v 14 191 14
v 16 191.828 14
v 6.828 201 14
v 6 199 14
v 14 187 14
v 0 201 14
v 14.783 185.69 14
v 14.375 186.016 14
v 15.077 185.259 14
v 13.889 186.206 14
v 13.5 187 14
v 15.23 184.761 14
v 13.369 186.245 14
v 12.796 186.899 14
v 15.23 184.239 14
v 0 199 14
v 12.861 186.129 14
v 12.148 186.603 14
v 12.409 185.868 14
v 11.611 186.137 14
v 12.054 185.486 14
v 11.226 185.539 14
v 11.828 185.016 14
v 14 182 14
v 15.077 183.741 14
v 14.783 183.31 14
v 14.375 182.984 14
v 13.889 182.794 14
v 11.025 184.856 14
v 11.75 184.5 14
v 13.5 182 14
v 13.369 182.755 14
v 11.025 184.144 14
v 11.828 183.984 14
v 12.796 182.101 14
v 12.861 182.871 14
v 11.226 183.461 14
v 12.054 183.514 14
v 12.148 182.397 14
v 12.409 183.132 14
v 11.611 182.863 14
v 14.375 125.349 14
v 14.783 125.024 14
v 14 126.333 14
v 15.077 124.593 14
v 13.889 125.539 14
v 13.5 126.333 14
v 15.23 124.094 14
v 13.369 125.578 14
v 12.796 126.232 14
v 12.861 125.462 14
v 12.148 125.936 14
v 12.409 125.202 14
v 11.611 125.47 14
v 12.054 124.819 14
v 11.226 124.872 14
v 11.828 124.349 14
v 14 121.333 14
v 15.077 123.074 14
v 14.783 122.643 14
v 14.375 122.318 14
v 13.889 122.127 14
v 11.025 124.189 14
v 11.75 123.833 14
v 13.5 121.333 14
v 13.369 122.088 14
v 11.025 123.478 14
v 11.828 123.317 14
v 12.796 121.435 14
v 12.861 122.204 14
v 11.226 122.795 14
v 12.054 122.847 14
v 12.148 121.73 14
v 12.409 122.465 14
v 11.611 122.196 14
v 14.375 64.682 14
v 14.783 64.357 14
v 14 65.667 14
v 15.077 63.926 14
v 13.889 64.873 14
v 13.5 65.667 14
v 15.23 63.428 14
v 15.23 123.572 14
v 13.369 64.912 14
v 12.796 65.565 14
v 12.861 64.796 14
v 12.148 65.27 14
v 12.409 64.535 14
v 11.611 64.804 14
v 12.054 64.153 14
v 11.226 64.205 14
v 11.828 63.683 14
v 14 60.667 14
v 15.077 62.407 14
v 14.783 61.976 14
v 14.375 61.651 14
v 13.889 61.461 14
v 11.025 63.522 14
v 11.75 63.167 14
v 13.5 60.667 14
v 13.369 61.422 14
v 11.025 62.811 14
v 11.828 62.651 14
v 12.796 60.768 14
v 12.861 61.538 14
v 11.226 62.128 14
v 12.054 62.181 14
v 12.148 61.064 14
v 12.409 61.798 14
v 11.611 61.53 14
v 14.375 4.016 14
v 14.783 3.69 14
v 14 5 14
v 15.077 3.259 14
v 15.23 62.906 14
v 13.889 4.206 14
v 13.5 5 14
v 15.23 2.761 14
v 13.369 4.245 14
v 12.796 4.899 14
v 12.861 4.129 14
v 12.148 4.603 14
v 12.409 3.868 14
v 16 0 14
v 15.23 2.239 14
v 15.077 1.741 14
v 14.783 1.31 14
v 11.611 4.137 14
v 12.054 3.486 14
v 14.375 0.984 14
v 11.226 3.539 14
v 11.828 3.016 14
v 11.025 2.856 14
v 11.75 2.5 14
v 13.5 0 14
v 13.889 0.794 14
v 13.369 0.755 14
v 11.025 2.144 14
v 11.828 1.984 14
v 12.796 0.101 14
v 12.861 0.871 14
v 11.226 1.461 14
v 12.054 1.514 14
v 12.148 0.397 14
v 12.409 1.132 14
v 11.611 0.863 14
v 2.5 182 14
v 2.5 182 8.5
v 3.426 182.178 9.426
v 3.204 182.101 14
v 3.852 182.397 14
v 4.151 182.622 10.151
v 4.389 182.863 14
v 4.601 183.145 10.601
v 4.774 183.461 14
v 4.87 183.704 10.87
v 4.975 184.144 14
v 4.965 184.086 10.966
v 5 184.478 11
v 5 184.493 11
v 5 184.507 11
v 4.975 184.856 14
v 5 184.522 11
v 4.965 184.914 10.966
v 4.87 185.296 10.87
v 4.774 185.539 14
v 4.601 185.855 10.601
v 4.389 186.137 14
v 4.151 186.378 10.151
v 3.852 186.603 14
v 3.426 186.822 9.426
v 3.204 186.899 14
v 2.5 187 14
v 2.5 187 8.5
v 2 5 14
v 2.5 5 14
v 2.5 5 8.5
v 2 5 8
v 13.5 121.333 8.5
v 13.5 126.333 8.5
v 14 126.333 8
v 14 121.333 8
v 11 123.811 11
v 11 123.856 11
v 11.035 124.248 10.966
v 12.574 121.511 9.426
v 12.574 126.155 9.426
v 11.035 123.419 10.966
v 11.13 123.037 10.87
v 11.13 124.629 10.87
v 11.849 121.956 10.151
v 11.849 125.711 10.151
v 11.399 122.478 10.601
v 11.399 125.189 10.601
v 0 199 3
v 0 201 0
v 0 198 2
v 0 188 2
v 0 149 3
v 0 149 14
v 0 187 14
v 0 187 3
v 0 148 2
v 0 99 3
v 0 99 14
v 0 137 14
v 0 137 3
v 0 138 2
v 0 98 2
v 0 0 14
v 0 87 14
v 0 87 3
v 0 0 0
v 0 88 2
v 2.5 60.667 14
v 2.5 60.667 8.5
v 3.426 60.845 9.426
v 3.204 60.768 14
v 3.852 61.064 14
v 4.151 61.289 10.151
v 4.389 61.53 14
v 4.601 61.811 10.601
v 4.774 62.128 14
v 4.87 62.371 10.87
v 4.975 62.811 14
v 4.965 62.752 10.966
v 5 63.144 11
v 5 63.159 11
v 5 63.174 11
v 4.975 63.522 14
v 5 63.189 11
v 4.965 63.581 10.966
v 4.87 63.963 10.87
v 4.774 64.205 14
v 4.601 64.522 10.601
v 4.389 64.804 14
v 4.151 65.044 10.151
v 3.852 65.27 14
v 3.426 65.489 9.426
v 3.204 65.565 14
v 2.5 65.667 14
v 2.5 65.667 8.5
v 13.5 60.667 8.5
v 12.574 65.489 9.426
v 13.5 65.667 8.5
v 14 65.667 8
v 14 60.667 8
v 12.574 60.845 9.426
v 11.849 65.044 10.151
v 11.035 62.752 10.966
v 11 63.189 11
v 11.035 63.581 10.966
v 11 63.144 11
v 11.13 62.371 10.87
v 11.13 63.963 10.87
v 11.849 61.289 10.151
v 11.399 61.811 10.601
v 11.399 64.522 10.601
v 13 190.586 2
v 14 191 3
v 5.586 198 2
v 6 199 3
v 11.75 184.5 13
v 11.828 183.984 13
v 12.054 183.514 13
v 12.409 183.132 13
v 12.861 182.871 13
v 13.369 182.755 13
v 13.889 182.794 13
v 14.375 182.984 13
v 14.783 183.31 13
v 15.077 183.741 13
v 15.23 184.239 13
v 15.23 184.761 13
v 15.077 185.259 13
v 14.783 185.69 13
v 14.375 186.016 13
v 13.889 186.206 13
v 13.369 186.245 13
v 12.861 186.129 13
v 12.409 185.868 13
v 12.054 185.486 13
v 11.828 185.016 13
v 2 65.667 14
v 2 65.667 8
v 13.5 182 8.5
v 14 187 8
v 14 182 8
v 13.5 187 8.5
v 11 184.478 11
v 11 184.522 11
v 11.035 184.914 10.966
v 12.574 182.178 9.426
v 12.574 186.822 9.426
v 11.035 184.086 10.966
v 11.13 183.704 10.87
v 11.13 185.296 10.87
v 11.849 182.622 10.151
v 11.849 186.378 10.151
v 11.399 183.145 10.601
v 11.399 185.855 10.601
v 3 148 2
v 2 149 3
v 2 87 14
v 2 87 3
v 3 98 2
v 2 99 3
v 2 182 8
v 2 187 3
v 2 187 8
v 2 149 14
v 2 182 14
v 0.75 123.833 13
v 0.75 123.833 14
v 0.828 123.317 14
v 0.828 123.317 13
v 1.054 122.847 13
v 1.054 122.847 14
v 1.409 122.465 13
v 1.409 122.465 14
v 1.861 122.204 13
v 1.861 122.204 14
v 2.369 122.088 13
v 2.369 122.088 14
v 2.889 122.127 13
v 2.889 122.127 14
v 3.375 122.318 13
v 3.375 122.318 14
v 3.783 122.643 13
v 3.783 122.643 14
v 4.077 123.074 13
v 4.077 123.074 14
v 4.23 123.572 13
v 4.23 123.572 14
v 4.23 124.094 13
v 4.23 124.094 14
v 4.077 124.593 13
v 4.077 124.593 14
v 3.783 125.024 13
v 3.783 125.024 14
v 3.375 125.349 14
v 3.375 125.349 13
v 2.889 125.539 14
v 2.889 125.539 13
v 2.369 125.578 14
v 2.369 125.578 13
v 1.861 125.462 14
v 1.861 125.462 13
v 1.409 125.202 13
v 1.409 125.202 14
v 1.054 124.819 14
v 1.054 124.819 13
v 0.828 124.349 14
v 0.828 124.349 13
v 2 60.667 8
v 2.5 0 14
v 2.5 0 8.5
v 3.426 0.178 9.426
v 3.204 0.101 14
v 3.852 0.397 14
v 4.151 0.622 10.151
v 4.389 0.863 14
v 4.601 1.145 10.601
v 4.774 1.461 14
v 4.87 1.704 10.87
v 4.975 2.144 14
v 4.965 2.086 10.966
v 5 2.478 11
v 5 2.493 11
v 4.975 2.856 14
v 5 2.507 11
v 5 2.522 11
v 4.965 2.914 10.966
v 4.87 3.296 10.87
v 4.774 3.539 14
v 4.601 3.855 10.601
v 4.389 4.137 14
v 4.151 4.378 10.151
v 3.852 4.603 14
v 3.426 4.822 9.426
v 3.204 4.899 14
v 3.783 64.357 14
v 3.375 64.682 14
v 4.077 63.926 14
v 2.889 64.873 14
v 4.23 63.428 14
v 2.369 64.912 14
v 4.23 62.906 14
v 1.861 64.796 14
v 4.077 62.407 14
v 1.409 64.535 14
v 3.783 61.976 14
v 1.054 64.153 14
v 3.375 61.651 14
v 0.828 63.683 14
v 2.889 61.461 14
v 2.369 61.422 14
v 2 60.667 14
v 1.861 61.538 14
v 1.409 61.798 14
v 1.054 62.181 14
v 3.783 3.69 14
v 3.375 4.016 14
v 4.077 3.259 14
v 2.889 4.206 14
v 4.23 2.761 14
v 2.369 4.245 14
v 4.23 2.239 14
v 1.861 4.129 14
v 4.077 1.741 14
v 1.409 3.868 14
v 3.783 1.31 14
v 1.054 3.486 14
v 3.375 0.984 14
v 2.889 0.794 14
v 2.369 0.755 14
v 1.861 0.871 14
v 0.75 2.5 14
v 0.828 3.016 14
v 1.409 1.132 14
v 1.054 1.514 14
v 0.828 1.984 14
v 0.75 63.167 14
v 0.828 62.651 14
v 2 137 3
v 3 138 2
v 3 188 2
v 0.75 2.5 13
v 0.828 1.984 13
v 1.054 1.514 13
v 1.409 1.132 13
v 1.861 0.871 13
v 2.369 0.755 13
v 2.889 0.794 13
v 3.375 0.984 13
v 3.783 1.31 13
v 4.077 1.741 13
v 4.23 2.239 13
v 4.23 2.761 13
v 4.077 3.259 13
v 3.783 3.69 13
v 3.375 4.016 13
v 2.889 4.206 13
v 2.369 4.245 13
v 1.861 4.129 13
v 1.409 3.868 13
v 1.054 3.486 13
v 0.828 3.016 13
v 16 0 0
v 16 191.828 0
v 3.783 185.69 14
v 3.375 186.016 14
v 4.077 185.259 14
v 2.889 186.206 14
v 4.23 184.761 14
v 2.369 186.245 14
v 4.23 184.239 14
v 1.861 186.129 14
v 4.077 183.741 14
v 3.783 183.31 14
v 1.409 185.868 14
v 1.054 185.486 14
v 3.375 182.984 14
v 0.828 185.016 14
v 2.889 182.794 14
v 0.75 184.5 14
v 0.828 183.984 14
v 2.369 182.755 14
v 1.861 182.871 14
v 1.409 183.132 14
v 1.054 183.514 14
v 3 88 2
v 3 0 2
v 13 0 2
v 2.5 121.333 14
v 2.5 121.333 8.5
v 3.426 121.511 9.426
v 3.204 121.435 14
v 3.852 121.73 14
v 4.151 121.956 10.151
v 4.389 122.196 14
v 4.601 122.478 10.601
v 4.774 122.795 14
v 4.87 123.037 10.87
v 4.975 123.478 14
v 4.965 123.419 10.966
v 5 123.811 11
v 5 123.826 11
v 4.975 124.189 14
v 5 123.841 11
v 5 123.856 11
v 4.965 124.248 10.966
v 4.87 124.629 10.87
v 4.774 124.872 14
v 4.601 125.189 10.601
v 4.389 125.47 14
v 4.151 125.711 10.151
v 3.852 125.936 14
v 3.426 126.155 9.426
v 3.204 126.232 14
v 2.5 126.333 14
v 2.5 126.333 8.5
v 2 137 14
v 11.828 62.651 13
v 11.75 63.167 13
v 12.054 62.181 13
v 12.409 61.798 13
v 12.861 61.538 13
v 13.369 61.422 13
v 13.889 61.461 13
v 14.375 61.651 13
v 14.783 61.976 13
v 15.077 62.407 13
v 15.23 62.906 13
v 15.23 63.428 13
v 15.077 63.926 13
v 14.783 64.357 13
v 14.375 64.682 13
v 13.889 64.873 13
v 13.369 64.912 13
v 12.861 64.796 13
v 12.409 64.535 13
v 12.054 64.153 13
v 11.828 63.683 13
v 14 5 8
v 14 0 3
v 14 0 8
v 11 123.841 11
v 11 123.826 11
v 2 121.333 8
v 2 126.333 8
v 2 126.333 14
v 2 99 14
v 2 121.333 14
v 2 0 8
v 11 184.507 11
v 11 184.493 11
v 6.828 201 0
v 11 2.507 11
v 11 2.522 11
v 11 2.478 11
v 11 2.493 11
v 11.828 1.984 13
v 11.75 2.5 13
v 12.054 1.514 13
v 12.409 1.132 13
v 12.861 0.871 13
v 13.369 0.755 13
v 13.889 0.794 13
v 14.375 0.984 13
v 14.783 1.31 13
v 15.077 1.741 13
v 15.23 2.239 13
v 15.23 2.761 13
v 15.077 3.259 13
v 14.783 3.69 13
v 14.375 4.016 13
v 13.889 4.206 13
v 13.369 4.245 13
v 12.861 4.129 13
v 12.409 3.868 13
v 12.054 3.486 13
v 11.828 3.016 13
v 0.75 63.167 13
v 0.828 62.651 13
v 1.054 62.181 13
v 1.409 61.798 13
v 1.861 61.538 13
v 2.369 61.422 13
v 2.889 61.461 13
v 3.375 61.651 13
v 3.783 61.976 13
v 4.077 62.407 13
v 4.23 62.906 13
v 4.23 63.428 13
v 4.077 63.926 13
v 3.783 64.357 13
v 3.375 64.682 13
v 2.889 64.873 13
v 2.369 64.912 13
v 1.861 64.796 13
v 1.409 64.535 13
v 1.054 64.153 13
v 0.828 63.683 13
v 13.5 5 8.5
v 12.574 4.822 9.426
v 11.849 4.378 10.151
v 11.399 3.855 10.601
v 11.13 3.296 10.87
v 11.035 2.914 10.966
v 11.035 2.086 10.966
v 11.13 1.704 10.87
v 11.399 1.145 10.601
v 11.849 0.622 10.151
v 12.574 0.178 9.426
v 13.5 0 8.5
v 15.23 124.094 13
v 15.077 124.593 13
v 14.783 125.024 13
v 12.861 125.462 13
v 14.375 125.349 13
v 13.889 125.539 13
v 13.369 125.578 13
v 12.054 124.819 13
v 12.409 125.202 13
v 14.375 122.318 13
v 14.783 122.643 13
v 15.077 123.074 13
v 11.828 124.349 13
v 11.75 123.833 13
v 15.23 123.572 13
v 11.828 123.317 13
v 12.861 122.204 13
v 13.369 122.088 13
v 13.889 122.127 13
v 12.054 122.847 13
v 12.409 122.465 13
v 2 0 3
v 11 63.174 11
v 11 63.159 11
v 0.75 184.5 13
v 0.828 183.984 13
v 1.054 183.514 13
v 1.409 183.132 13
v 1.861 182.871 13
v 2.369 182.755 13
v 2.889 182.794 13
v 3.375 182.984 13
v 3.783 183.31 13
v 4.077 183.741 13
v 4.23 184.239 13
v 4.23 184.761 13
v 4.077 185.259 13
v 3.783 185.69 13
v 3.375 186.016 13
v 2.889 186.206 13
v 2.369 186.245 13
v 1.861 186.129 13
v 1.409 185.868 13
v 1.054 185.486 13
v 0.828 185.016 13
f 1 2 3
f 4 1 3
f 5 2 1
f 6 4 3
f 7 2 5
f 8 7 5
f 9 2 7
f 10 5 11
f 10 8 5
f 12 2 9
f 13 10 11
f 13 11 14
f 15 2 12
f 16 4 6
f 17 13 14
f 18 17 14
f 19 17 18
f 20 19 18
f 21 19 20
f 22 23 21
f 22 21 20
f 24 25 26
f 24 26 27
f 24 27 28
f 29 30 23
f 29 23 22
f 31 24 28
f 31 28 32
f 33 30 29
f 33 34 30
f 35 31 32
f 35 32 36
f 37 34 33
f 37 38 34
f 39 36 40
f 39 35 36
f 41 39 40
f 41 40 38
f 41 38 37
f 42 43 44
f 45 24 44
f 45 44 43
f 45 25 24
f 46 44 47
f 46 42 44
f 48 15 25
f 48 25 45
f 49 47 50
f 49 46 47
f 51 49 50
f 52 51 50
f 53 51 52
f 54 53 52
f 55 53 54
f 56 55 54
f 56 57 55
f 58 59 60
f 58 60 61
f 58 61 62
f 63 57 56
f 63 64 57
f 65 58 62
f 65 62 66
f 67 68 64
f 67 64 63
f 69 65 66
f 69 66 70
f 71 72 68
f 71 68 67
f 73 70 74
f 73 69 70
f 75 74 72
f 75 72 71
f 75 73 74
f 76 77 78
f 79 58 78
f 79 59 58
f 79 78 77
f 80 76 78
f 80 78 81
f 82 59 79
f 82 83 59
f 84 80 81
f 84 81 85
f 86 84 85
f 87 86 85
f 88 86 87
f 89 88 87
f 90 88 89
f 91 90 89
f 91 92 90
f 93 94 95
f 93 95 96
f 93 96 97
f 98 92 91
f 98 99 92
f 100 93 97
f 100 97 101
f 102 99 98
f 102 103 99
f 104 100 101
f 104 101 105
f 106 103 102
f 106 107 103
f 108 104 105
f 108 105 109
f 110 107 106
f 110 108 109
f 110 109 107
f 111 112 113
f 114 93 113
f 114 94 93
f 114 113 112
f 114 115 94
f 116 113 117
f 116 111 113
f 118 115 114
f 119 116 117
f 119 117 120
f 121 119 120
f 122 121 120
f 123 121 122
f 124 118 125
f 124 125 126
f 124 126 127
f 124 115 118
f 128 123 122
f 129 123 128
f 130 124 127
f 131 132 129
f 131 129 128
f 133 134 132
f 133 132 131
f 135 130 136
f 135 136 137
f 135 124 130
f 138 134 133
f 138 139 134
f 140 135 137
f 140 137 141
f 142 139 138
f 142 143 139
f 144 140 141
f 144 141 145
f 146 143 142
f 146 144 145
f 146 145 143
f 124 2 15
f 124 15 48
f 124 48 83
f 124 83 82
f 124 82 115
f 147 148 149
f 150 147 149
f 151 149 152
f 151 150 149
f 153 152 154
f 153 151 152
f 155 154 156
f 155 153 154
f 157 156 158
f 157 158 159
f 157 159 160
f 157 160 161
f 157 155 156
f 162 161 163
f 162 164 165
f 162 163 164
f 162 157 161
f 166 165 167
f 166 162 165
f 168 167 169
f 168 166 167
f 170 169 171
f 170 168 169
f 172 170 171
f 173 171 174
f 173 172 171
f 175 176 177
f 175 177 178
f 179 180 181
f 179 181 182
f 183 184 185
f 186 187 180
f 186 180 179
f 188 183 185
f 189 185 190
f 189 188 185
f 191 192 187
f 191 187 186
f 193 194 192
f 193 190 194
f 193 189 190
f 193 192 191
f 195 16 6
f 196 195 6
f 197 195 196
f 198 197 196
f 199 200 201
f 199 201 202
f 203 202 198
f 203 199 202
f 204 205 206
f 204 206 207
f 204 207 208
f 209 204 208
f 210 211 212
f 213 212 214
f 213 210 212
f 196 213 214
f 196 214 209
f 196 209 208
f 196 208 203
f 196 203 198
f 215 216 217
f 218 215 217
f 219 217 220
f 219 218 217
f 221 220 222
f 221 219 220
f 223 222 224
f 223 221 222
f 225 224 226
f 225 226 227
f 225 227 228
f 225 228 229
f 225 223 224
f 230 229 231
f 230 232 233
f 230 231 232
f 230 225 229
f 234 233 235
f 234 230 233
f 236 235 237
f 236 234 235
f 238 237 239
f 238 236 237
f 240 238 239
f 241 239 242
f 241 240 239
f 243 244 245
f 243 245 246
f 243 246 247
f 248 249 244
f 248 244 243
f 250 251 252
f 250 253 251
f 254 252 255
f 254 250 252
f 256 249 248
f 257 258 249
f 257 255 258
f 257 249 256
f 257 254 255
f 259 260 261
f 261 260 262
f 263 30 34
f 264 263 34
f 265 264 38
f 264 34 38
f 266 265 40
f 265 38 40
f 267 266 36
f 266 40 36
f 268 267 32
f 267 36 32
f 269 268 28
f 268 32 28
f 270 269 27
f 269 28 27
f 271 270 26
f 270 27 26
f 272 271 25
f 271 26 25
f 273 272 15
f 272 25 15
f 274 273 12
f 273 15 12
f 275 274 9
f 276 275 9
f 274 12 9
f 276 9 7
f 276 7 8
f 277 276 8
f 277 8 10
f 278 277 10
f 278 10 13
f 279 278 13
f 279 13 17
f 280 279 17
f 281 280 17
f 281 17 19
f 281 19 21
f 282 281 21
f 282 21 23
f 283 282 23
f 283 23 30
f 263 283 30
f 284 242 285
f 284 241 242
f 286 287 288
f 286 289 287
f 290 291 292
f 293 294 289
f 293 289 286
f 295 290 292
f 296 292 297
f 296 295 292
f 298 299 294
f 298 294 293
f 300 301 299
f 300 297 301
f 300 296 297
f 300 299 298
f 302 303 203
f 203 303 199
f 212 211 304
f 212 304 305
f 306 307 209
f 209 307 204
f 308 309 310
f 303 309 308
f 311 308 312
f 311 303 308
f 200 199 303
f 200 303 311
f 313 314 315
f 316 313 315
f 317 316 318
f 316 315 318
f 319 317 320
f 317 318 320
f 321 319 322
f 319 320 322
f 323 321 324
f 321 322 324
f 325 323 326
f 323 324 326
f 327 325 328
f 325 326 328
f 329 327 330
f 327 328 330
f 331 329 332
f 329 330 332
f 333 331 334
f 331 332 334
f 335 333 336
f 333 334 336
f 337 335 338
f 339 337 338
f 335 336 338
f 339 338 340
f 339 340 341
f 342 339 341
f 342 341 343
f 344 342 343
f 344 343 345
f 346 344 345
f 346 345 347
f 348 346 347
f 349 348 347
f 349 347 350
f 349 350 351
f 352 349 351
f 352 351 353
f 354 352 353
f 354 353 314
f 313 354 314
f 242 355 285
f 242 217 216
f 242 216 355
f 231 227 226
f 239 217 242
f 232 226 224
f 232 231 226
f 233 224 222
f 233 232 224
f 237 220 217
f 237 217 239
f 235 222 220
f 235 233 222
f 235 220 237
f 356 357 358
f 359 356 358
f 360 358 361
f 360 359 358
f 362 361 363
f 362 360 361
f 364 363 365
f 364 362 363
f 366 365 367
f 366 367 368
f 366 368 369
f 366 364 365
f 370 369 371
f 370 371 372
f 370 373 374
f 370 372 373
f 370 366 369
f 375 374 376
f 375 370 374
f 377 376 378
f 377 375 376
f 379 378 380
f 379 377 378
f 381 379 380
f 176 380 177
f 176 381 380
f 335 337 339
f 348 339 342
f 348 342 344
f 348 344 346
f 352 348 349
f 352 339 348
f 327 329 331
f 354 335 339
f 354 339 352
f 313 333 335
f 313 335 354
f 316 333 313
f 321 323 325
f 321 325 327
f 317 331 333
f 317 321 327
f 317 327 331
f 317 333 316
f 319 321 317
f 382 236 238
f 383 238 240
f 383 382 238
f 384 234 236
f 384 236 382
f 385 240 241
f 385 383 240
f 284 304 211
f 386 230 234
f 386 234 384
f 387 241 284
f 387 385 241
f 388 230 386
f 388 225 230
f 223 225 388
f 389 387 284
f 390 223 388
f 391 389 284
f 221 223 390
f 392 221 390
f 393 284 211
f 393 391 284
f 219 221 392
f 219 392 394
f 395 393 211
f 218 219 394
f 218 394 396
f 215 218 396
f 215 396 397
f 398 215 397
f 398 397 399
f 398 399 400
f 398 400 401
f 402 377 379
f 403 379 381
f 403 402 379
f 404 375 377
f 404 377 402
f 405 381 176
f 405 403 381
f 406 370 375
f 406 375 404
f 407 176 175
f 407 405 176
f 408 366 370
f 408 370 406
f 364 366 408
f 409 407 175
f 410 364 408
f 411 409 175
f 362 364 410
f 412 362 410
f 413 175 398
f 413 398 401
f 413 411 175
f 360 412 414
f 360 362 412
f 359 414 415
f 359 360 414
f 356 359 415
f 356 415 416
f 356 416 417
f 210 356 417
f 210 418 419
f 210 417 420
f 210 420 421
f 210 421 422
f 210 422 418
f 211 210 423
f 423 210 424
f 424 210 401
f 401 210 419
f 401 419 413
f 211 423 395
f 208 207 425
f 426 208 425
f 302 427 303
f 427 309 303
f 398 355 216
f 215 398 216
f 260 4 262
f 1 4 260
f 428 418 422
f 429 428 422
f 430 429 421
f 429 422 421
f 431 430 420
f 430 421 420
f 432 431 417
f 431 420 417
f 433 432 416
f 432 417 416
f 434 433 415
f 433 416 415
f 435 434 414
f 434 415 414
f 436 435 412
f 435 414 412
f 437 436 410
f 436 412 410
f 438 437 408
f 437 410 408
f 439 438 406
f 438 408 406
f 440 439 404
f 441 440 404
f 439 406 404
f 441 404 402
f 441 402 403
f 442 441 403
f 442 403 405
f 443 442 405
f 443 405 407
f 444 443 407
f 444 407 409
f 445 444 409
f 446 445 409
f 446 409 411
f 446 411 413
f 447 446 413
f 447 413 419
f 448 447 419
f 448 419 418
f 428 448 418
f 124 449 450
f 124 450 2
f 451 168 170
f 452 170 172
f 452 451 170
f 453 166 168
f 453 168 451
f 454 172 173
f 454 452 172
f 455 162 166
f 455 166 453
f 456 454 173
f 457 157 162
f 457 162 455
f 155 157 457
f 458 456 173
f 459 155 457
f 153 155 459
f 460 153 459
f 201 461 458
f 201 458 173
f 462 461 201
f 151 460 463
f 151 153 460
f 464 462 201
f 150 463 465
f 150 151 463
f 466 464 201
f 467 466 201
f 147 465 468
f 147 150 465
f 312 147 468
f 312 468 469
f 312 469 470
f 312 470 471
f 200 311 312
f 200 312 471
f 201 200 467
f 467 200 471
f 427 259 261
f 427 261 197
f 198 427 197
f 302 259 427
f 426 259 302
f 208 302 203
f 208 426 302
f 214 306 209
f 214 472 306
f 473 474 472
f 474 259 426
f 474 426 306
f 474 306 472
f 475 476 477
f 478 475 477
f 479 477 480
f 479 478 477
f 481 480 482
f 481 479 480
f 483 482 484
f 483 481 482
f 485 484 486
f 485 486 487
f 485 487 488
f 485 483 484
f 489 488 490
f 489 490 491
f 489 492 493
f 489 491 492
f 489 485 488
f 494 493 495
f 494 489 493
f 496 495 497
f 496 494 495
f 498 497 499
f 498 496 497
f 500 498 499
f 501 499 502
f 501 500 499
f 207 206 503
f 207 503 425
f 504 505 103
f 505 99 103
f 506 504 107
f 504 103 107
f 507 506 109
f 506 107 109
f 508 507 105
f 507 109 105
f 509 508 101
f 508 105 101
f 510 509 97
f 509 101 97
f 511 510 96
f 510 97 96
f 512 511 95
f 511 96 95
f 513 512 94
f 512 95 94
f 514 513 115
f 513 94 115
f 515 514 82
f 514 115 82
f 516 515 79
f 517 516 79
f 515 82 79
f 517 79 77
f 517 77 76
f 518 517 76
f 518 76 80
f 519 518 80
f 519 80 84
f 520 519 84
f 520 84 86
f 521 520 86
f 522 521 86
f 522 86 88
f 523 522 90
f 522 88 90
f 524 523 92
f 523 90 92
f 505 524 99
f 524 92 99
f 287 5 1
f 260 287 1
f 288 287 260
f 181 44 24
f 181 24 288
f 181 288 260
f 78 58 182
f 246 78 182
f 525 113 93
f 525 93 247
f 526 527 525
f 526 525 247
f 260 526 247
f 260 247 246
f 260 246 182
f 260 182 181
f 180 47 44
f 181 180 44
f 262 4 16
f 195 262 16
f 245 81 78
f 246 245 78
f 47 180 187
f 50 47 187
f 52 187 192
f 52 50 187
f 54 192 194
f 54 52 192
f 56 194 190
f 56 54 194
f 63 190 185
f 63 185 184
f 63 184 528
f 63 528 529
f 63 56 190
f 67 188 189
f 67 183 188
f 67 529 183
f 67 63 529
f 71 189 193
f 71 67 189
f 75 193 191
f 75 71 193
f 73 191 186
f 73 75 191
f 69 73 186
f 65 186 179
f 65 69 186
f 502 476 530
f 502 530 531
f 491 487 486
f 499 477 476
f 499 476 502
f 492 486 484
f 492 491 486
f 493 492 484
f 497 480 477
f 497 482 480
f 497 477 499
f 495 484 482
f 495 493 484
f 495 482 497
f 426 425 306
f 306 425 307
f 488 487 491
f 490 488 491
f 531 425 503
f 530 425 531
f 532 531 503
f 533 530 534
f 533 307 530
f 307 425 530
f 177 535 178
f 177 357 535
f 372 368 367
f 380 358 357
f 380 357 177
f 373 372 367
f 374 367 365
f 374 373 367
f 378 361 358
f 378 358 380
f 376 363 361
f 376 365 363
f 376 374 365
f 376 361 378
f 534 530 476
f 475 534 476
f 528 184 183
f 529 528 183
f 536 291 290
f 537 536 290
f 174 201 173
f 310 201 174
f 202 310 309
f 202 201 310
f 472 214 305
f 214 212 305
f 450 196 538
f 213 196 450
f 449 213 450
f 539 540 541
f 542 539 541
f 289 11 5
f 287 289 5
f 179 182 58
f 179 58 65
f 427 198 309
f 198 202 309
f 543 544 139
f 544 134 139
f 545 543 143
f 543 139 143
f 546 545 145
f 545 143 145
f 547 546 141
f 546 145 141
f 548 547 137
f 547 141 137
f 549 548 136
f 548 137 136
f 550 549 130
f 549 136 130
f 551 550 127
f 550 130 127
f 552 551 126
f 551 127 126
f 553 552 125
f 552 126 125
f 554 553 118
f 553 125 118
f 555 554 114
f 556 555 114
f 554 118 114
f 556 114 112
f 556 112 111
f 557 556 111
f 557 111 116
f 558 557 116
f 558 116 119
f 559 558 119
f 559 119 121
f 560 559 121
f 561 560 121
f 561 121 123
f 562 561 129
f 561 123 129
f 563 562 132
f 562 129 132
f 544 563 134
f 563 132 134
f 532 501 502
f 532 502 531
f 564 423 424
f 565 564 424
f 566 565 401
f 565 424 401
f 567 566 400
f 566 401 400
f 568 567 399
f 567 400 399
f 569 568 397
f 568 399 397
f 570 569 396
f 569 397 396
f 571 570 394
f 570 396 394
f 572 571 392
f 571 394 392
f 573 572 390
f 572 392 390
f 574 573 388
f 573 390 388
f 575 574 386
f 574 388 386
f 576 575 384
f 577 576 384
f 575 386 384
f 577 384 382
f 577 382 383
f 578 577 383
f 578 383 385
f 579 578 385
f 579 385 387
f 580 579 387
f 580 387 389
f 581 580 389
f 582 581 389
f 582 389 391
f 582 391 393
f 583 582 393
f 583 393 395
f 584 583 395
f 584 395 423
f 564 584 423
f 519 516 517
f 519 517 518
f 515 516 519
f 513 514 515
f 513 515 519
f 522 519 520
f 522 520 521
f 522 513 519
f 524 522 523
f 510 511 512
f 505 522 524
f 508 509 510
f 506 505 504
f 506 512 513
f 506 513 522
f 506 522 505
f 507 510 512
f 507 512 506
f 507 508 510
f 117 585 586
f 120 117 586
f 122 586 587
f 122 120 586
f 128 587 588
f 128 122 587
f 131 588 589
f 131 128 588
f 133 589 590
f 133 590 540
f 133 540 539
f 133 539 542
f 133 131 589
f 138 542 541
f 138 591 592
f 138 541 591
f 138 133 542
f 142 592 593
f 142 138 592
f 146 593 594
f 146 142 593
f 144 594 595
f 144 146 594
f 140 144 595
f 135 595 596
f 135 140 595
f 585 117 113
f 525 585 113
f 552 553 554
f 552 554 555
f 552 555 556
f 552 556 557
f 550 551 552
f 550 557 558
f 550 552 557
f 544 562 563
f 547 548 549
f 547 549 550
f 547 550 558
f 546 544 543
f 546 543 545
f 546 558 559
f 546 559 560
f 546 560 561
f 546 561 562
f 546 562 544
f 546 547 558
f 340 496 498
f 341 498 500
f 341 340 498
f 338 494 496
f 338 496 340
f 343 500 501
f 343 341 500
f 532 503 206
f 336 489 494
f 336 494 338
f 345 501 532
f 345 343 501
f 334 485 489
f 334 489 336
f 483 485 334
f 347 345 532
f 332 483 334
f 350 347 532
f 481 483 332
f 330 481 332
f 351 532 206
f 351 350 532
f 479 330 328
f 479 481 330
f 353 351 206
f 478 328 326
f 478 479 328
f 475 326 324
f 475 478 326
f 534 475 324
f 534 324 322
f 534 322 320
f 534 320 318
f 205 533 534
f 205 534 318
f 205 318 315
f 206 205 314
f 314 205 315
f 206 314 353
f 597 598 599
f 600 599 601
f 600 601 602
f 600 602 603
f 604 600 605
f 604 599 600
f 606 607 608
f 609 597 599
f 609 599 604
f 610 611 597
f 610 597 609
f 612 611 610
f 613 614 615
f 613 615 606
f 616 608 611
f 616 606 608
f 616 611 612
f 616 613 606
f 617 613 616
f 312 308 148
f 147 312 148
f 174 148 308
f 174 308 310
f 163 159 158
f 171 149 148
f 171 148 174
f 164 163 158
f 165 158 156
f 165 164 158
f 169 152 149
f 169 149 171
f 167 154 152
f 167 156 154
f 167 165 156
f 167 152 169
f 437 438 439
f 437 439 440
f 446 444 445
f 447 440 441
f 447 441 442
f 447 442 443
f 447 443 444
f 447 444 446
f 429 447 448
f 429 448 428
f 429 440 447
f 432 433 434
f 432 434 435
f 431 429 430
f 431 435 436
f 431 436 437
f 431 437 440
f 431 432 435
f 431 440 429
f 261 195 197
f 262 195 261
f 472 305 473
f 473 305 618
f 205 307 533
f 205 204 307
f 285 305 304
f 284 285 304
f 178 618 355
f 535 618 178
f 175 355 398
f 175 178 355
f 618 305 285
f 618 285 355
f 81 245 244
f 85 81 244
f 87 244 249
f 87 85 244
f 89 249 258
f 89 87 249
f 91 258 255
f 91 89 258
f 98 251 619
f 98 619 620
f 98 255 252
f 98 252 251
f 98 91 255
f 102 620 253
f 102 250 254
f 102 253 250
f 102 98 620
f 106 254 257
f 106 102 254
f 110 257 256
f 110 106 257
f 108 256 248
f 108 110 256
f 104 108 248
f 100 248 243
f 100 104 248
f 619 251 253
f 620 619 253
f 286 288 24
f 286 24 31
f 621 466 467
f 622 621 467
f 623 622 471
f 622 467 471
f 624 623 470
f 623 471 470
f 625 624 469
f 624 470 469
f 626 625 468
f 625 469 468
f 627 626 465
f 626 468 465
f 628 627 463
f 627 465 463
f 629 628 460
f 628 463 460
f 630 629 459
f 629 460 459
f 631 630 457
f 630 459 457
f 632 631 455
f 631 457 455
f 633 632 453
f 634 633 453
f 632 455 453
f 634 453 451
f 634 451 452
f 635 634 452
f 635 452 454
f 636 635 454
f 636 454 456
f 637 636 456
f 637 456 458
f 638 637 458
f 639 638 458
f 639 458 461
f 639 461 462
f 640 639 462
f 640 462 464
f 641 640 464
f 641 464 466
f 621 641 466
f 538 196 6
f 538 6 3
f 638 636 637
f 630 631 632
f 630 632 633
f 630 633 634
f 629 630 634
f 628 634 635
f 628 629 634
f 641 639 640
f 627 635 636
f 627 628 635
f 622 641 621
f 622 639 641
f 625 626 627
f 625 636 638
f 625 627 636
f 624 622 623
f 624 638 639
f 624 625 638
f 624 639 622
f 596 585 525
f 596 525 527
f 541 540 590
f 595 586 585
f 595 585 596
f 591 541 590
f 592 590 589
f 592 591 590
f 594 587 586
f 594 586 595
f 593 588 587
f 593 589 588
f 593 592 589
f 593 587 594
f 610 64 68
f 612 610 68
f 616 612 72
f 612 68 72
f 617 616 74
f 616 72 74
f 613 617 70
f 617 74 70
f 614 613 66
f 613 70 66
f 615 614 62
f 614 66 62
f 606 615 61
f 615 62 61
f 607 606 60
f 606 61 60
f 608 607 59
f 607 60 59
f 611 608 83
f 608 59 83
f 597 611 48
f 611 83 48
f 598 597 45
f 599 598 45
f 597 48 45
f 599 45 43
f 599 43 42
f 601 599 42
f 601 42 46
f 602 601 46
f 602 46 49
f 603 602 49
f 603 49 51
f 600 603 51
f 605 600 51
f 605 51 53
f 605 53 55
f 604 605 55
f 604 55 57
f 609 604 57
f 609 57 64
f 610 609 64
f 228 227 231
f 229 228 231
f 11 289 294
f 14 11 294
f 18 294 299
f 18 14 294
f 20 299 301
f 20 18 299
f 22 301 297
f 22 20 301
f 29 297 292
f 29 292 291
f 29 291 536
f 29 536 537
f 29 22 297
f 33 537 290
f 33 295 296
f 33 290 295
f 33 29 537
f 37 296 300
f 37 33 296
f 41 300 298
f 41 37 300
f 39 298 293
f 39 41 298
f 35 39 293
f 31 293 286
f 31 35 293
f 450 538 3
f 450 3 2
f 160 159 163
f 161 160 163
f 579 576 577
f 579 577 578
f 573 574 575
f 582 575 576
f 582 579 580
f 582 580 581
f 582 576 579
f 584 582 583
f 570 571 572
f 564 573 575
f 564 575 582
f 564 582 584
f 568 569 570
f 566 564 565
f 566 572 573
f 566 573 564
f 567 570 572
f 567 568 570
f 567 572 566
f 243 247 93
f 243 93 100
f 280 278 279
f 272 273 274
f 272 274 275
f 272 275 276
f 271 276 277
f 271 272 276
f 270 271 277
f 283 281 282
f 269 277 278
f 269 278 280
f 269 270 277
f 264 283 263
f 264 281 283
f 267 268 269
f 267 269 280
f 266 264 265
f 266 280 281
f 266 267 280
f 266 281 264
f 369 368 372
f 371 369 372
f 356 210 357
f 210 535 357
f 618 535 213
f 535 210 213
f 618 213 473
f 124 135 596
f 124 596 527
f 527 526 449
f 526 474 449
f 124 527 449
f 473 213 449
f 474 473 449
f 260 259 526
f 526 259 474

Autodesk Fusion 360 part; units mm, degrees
sketch "3D-printed conduit outline" plane through (0, 0, 0) normal (0, 1, 0) x (1, 0, 0)
  line L0 (0, 0) -> (16, 0)
  line L1 (16, 0) -> (16, -14)
  line L2 (16, -14) -> (0, -14)
  line L3 (0, -14) -> (0, 0)
  line L4 (2, -14) -> (14, -14)
  line L5 (14, -14) -> (14, -2)
  line L6 (14, -2) -> (2, -2)
  line L7 (2, -2) -> (2, -14)
  dimension "d8" = 14
  dimension "d9" = 16
  dimension "d10" = 2
  dimension "d11" = 2
  dimension "d12" = 2
extrude "Extrude1" add sketch "3D-printed conduit outline" along normal blind 201 contours L0 L1 L2 L3 L5 L6 L7
sketch "Magnet holders" plane through (0, 0, 14) normal (0, 0, 1) x (-1, 0, 0)
  line L0 (0, 0) -> (-2, 0)
  line L1 (-2, 0) -> (-2, -201)
  line L2 (-2, -201) -> (0, -201)
  line L3 (0, -201) -> (0, 0)
  line L4 (-14, 0) -> (-16, 0)
  line L5 (-16, 0) -> (-16, -201)
  line L6 (-16, -201) -> (-14, -201)
  line L7 (-14, -201) -> (-14, 0)
  circle A0 centre (-2.5, -2.5) radius 2.5
  circle A1 centre (-2.5, -2.5) radius 1.75
  line L8 (-14, 0) -> (-2, 0)
  line L9 (0, 0) -> (-2.5, 0)
  line L10 (-2.5, 0) -> (-2.5, -5)
  line L11 (-2.5, -5) -> (0, -5)
  line L12 (0, -5) -> (0, 0)
  circle A2 centre (-13.5, -2.5) radius 2.5
  circle A3 centre (-13.5, -2.5) radius 1.75
  line L13 (-16, 0) -> (-13.5, 0)
  line L14 (-13.5, 0) -> (-13.5, -5)
  line L15 (-13.5, -5) -> (-16, -5)
  line L16 (-16, -5) -> (-16, 0)
  circle A4 centre (-2.5, -63.1667) radius 1.75
  circle A5 centre (-2.5, -63.1667) radius 2.5
  line L17 (-2.5, -60.6667) -> (-2.5, -65.6667)
  line L18 (-2.5, -65.6667) -> (0, -65.6667)
  line L19 (0, -65.6667) -> (0, -60.6667)
  line L20 (0, -60.6667) -> (-2.5, -60.6667)
  circle A6 centre (-13.5, -63.1667) radius 1.75
  circle A7 centre (-13.5, -63.1667) radius 2.5
  line L21 (-13.5, -60.6667) -> (-13.5, -65.6667)
  line L22 (-13.5, -65.6667) -> (-16, -65.6667)
  line L23 (-16, -65.6667) -> (-16, -60.6667)
  line L24 (-16, -60.6667) -> (-13.5, -60.6667)
  circle A8 centre (-2.5, -123.8333) radius 1.75
  circle A9 centre (-2.5, -123.8333) radius 2.5
  line L25 (-2.5, -121.3333) -> (-2.5, -126.3333)
  line L26 (-2.5, -126.3333) -> (0, -126.3333)
  line L27 (0, -126.3333) -> (0, -121.3333)
  line L28 (0, -121.3333) -> (-2.5, -121.3333)
  circle A10 centre (-13.5, -123.8333) radius 1.75
  circle A11 centre (-13.5, -123.8333) radius 2.5
  line L29 (-13.5, -121.3333) -> (-13.5, -126.3333)
  line L30 (-13.5, -126.3333) -> (-16, -126.3333)
  line L31 (-16, -126.3333) -> (-16, -121.3333)
  line L32 (-16, -121.3333) -> (-13.5, -121.3333)
  circle A12 centre (-2.5, -184.5) radius 1.75
  circle A13 centre (-2.5, -184.5) radius 2.5
  line L33 (-2.5, -182) -> (-2.5, -187)
  line L34 (-2.5, -187) -> (0, -187)
  line L35 (0, -187) -> (0, -182)
  line L36 (0, -182) -> (-2.5, -182)
  circle A14 centre (-13.5, -184.5) radius 1.75
  circle A15 centre (-13.5, -184.5) radius 2.5
  line L37 (-13.5, -182) -> (-13.5, -187)
  line L38 (-13.5, -187) -> (-16, -187)
  line L39 (-16, -187) -> (-16, -182)
  line L40 (-16, -182) -> (-13.5, -182)
  dimension "d15" = 5
  dimension "d16" = 3.5
  dimension "d17" = 5
  dimension "d18" = 3.5
  dimension "d21" = 0
  dimension "d22" = -182
sketch "End wall" plane through (0, 201, 0) normal (0, 1, 0) x (-1, 0, 0)
  line L0 (-2, 2) -> (-14, 2)
  line L1 (-14, 2) -> (-14, 14)
  line L2 (-14, 14) -> (-16, 14)
  line L3 (-16, 14) -> (-16, 0)
  line L4 (-16, 0) -> (0, 0)
  line L5 (0, 0) -> (0, 14)
  line L6 (0, 14) -> (-2, 14)
  line L7 (-2, 14) -> (-2, 2)
  line L8 (-16, 0) -> (0, 0)
  line L9 (0, 0) -> (0, 14)
  line L10 (0, 14) -> (-16, 14)
  line L11 (-16, 14) -> (-16, 0)
extrude "Extrude5" add sketch "End wall" against normal blind 2
extrude "Extrude2" add sketch "Magnet holders" against normal blind 3 contours A2 A3 L14 | L7 A2 A3 L14 | L7 L8 A2 L13 | L1 A0 L8 L9 | L1 A0 A1 L10 | A0 A1 L10 | L1 A0 A1 L10 | L1 A0 L11 | L1 A1 L10 | A1 L10 | L7 A3 L14 | A3 L14 | L1 A5 L20 | L7 A2 L15 | L7 A2 A3 L14 | L1 A4 A5 L17 | L1 A4 A5 L17 | L1 A5 L18 | A4 A5 L17 | L1 A4 L17 | A4 L17 | L7 A7 L24 | L1 A9 L28 | L7 A6 A7 L21 | A6 A7 L21 | L1 A8 A9 L25 | L1 A8 A9 L25 | L1 A9 L26 | A8 A9 L25 | L7 A6 L21 | A6 L21 | L7 A7 L22 | L7 A6 A7 L21 | L1 A8 L25 | A8 L25 | L1 A13 L36 | L7 A11 L32 | L1 A12 A13 L33 | L1 A12 A13 L33 | L1 A13 L34 | A12 A13 L33 | L7 A10 A11 L29 | L7 A11 L30 | L7 A10 A11 L29 | A10 A11 L29 | L1 A12 L33 | A12 L33 | L7 A10 L29 | A10 L29 | L7 A15 L40 | L7 A14 A15 L37 | L7 A15 L38 | L7 A14 A15 L37 | A14 A15 L37 | L7 A14 L37 | A14 L37
extrude "Extrude6" cut sketch "Magnet holders" against normal blind 1 contours L1 A1 | L1 A1 L10 | A1 L10 | L7 A3 L14 | A3 L14 | L7 A3 | L1 A4 | L1 A4 L17 | A4 L17 | L7 A6 L21 | L7 A6 | A6 L21 | L1 A8 | L1 A8 L25 | A8 L25 | L1 A12 | L1 A12 L33 | A12 L33 | L7 A10 L29 | L7 A10 | A10 L29 | L7 A14 L37 | L7 A14 | A14 L37
chamfer "Chamfer2" distance 2.9999 angle 45 11 edges at (2, 2.5, 11) (2, 63.1667, 11) (2, 123.8333, 11) (2, 2.5, 11) (2, 123.8333, 11) (2, 63.1667, 11) (2, 184.5, 11) (14, 2.5, 11) (14, 63.1667, 11) (14, 123.8333, 11) (14, 184.5, 11)
sketch "Arcade button outlets" plane through (0, 0, 0) normal (-1, 0, 0) x (0, -1, 0)
  line L0 (0, 0) -> (0, 14)
  line L1 (0, 14) -> (-201, 14)
  line L2 (-201, 14) -> (-201, 0)
  line L3 (-201, 0) -> (0, 0)
  line L4 (-199, 14) -> (-187, 14)
  line L5 (-187, 14) -> (-187, 2)
  line L6 (-187, 2) -> (-199, 2)
  line L7 (-199, 2) -> (-199, 14)
  line L8 (-149, 14) -> (-137, 14)
  line L9 (-137, 14) -> (-137, 2)
  line L10 (-137, 2) -> (-149, 2)
  line L11 (-149, 2) -> (-149, 14)
  line L12 (-99, 14) -> (-87, 14)
  line L13 (-87, 14) -> (-87, 2)
  line L14 (-87, 2) -> (-99, 2)
  line L15 (-99, 2) -> (-99, 14)
  dimension "d29" = 2
  dimension "d30" = 12
  dimension "d31" = 12
  dimension "d32" = 12
  dimension "d33" = 2
  dimension "d34" = 38
  dimension "d35" = 38
extrude "Extrude4" cut sketch "Arcade button outlets" against normal blind 2 contours L1 L12 L13 L14 L15 | L1 L4 L5 L6 L7 | L1 L8 L9 L10 L11
sketch "End chamfer" plane through (0, 0, 14) normal (0, 0, 1) x (-1, 0, 0)
  line L0 (0, -199) -> (-14, -199)
  line L1 (-14, -199) -> (-14, -187)
  line L2 (-14, -187) -> (-13.5, -187)
  arc A0 (-13.5, -187) -> (-13.5, -182) centre (-13.5, -184.5) ccw
  line L3 (-13.5, -182) -> (-14, -182)
  line L4 (-14, -182) -> (-14, -126.3333)
  line L5 (-14, -126.3333) -> (-13.5, -126.3333)
  arc A1 (-13.5, -126.3333) -> (-13.5, -121.3333) centre (-13.5, -123.8333) ccw
  line L6 (-13.5, -121.3333) -> (-14, -121.3333)
  line L7 (-14, -121.3333) -> (-14, -65.6667)
  line L8 (-14, -65.6667) -> (-13.5, -65.6667)
  arc A2 (-13.5, -65.6667) -> (-13.5, -60.6667) centre (-13.5, -63.1667) ccw
  line L9 (-13.5, -60.6667) -> (-14, -60.6667)
  line L10 (-14, -60.6667) -> (-14, -5)
  line L11 (-14, -5) -> (-13.5, -5)
  arc A3 (-13.5, -5) -> (-13.5, 0) centre (-13.5, -2.5) ccw
  line L12 (-13.5, 0) -> (-16, 0)
  line L13 (-16, 0) -> (-16, -201)
  line L14 (-16, -201) -> (0, -201)
  line L15 (0, -201) -> (0, -199)
  circle A4 centre (-13.5, -2.5) radius 1.75
  circle A5 centre (-13.5, -63.1667) radius 1.75
  circle A6 centre (-13.5, -184.5) radius 1.75
  circle A7 centre (-13.5, -123.8333) radius 1.75
  line L16 (-6.8284, -201) -> (-16, -191.8284)
  line L17 (-4, -201) -> (-16, -189)
  line L18 (-2, -149) -> (-2, -182)
  line L19 (0, -193) -> (-8, -193)
  line L20 (0, -187) -> (0, -199)
  line L21 (-4, -193) -> (-8, -189)
  line L22 (-4, -193) -> (-0.3616, -193) construction
  line L23 (-8, -189) -> (-8, -193)
  line L24 (-10, -195) -> (-2, -187)
  line L25 (-2.5, -187) -> (0, -187)
  line L26 (-4, -201) -> (-6.8284, -201)
  line L27 (-16, -191.8284) -> (-16, -189)
  point P0 (-6, -191)
  dimension "d46" = 6
  dimension "d47" = 8
  dimension "d49" = 135
  dimension "d50" = 4
  dimension "d51" = 2
  dimension "d52" = 2
extrude "Extrude8" add sketch "End chamfer" against normal blind 12 contours L0 L14 L16 L17 L26 | L0 L1 L16 L17 | L1 L13 L16 L17 L27
extrude "Extrude7" cut sketch "End chamfer" against normal blind 14 contours L0 L1 L13 L14 L16 | L0 L1 L16
chamfer "Chamfer4" distance 1 angle 45 11 edges at (2, 43.5, 2) (1, 87, 2) (1, 99, 2) (2, 118, 2) (1, 137, 2) (1, 149, 2) (2, 168, 2) (1, 187, 2) (3, 199, 2) (10, 195, 2) (14, 95.5, 2)
equation "conduit_length = 201 mm"
equation "conduit_width = 16 mm"
equation "conduit_height = 16 mm"
equation "conduit_wall_thickness = 2 mm"
equation "magnet_diameter = 3 mm"
equation "magnet_height = 1 mm"
equation "d8 = conduit_height - conduit_wall_thickness"
equation "d9 = conduit_width"
equation "d10 = conduit_wall_thickness"
equation "d11 = conduit_wall_thickness"
equation "d12 = conduit_wall_thickness"
equation "d13 = conduit_length"
equation "d15 = magnet_diameter + 2 mm"
equation "d16 = magnet_diameter + 0.5 mm"
equation "d17 = magnet_diameter + 2 mm"
equation "d18 = magnet_diameter + 0.5 mm"
equation "d22 = -conduit_length + ( magnet_diameter + 2 mm ) + 14 mm"
equation "d23 = -( magnet_height + 2 mm )"
equation "d29 = conduit_wall_thickness"
equation "d33 = conduit_wall_thickness"
equation "d47 = conduit_wall_thickness + ( conduit_width - 2 * conduit_wall_thickness ) / 2"
equation "d50 = Linear Dimension-4"
equation "d51 = conduit_wall_thickness"
equation "d52 = conduit_wall_thickness"
equation "d55 = -( conduit_height - 2 * conduit_wall_thickness )"
